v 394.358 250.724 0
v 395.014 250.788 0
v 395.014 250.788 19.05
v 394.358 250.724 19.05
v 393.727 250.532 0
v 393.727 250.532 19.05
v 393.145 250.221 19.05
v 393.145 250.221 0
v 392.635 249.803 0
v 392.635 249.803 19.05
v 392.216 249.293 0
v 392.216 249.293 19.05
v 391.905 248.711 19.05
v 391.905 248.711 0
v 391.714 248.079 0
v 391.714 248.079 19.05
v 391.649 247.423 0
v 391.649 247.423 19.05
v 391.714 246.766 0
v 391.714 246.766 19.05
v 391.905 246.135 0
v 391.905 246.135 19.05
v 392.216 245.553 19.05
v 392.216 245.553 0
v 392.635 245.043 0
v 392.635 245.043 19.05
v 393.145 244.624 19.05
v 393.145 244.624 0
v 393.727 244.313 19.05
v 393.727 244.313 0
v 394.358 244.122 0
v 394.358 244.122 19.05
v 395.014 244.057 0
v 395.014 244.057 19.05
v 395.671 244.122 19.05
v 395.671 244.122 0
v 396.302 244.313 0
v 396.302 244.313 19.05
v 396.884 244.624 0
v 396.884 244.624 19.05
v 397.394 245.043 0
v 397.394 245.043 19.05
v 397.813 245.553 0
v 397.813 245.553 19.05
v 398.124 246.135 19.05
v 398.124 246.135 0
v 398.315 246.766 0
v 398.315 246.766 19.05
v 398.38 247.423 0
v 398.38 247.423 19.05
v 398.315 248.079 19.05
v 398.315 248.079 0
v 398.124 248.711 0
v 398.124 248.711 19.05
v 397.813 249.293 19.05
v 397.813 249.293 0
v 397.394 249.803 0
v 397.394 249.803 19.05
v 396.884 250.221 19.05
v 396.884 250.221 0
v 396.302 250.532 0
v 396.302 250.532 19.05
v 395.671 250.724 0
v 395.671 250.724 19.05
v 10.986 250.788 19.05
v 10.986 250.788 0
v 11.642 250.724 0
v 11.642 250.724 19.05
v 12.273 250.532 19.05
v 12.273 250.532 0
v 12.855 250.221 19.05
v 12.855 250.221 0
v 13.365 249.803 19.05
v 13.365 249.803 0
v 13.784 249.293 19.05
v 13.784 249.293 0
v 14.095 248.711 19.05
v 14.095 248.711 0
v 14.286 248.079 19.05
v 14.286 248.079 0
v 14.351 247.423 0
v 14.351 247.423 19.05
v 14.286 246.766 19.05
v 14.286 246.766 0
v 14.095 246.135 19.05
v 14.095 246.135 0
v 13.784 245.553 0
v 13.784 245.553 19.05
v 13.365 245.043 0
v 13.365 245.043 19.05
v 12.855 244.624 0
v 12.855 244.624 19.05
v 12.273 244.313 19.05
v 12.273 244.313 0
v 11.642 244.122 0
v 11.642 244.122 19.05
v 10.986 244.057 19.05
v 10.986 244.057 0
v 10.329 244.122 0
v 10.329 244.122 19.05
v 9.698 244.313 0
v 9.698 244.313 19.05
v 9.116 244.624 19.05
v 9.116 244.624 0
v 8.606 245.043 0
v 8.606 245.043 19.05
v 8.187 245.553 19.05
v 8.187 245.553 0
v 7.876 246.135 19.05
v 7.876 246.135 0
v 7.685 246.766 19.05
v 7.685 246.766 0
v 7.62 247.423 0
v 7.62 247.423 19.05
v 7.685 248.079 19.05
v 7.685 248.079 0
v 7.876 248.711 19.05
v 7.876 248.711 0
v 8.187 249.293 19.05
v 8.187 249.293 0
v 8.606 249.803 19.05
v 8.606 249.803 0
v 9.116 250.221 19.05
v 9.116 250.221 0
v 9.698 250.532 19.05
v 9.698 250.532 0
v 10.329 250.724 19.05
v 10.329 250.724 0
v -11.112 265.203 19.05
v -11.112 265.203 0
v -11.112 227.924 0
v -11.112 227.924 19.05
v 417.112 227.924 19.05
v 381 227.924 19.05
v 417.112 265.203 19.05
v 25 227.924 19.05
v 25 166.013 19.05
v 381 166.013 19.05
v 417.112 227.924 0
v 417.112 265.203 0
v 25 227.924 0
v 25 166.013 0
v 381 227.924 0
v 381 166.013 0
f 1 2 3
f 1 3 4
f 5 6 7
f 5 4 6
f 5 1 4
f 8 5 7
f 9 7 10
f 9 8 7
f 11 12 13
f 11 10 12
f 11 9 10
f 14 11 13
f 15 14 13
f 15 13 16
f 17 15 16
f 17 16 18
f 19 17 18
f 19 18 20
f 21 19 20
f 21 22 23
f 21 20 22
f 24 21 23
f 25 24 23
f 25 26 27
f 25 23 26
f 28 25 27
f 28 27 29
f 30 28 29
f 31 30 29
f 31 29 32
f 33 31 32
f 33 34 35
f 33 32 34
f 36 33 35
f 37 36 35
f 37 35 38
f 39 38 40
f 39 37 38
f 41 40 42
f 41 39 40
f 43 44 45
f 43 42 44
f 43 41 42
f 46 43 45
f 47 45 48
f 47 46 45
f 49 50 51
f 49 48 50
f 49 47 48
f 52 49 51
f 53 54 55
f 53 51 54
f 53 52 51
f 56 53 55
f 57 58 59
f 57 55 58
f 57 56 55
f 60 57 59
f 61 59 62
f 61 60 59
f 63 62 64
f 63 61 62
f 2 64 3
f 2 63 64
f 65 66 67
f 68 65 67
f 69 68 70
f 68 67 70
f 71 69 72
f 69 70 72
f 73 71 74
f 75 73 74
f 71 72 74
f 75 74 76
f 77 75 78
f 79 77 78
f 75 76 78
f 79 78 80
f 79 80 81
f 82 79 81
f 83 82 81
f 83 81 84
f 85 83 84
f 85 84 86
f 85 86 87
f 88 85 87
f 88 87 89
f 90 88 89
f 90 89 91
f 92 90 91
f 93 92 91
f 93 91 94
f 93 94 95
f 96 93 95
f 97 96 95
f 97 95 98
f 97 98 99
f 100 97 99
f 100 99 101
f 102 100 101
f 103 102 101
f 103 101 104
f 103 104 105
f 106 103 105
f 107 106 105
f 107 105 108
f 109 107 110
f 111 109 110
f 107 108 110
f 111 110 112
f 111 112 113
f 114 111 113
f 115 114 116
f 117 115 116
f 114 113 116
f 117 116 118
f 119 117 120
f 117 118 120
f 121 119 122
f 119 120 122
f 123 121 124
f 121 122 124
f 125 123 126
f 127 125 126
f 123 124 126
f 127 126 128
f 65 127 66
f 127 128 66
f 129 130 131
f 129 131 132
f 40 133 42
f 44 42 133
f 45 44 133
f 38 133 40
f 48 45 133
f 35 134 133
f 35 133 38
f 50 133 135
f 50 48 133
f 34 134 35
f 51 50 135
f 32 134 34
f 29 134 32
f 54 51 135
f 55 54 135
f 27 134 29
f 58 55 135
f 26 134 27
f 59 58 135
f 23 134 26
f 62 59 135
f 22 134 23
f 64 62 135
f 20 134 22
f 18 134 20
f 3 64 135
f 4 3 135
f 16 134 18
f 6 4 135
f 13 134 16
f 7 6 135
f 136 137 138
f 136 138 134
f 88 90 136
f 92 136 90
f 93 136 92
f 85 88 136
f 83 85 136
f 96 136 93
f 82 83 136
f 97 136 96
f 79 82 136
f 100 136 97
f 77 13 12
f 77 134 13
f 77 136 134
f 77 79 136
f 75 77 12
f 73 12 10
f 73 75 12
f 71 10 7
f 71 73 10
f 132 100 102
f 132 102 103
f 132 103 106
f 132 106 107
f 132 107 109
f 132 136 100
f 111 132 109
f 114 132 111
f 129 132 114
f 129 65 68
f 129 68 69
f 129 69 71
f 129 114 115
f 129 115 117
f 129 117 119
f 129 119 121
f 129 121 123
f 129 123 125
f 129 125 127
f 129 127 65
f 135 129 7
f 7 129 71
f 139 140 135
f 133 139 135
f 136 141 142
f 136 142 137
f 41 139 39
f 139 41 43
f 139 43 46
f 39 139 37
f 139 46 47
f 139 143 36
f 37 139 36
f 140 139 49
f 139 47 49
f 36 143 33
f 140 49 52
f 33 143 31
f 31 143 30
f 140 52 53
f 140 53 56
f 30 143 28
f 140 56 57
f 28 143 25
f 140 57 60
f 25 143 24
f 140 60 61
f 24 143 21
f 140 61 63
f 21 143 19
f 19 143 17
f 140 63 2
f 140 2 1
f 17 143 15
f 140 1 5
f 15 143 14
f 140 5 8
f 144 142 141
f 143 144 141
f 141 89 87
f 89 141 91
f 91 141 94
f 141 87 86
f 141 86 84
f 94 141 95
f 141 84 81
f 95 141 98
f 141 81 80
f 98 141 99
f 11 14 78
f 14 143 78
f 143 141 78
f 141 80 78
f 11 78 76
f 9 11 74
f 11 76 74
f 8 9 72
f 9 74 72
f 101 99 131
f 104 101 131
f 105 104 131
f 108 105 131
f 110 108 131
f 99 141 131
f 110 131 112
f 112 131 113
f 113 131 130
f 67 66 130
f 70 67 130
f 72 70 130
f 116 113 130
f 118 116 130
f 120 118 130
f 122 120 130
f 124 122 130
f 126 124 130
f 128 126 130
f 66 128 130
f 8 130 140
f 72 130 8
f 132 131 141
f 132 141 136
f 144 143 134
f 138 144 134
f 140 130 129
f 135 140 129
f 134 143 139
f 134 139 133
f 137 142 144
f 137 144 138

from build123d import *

# Parameters (mm, degrees)
SKETCH2_W           = 19.05
SKETCH2_H           = 37.278922504
BOSS_EXTRUDE1_DEPTH = 428.225
BOSS_EXTRUDE2_DEPTH = 356
SKETCH6_R           = 3.3655
CUT_EXTRUDE1_DEPTH  = 25.4


with BuildPart() as part:
    # Sketch2 → Boss-Extrude1 (new body)
    with BuildSketch(Plane.ZY.offset(11.1125)):
        with Locations((9.525, 246.563328153)):
            Rectangle(SKETCH2_W, SKETCH2_H)
    extrude(amount=-BOSS_EXTRUDE1_DEPTH)

    # Sketch5 → Boss-Extrude2 (add)
    with BuildSketch(Plane.ZY.offset(-381)):
        Polygon((19.05, 227.923866901), (0, 227.923866901), (0, 201.997670401), (19.05, 224.857670401), align=None)
        Polygon((19.05, 224.857670401), (0, 201.997670401), (0, 192.286298431), (19.05, 215.146298431), align=None)
        Polygon((19.05, 215.146298431), (0, 192.286298431), (0, 166.012618521), (19.05, 188.872618521), align=None)
        Polygon((0, 166.012618521), (19.05, 166.012618521), (19.05, 188.872618521), align=None)
    extrude(amount=BOSS_EXTRUDE2_DEPTH)

    # Sketch6 → Cut-Extrude1 (cut)
    with BuildSketch(Plane(origin=(203, 213.395866862, -1.905), x_dir=(-1, 0, 0), z_dir=(0, 0, -1))):
        with Locations(Location((192.0145, 34.026922543, 0), (0, 0, 90))):
            Circle(SKETCH6_R)
    cut_extrude1 = extrude(amount=-CUT_EXTRUDE1_DEPTH, mode=Mode.SUBTRACT)

    # Mirror1: Cut-Extrude1 across plane
    add(cut_extrude1.mirror(Plane.ZY.offset(-203)), mode=Mode.SUBTRACT)


solid = part.part
